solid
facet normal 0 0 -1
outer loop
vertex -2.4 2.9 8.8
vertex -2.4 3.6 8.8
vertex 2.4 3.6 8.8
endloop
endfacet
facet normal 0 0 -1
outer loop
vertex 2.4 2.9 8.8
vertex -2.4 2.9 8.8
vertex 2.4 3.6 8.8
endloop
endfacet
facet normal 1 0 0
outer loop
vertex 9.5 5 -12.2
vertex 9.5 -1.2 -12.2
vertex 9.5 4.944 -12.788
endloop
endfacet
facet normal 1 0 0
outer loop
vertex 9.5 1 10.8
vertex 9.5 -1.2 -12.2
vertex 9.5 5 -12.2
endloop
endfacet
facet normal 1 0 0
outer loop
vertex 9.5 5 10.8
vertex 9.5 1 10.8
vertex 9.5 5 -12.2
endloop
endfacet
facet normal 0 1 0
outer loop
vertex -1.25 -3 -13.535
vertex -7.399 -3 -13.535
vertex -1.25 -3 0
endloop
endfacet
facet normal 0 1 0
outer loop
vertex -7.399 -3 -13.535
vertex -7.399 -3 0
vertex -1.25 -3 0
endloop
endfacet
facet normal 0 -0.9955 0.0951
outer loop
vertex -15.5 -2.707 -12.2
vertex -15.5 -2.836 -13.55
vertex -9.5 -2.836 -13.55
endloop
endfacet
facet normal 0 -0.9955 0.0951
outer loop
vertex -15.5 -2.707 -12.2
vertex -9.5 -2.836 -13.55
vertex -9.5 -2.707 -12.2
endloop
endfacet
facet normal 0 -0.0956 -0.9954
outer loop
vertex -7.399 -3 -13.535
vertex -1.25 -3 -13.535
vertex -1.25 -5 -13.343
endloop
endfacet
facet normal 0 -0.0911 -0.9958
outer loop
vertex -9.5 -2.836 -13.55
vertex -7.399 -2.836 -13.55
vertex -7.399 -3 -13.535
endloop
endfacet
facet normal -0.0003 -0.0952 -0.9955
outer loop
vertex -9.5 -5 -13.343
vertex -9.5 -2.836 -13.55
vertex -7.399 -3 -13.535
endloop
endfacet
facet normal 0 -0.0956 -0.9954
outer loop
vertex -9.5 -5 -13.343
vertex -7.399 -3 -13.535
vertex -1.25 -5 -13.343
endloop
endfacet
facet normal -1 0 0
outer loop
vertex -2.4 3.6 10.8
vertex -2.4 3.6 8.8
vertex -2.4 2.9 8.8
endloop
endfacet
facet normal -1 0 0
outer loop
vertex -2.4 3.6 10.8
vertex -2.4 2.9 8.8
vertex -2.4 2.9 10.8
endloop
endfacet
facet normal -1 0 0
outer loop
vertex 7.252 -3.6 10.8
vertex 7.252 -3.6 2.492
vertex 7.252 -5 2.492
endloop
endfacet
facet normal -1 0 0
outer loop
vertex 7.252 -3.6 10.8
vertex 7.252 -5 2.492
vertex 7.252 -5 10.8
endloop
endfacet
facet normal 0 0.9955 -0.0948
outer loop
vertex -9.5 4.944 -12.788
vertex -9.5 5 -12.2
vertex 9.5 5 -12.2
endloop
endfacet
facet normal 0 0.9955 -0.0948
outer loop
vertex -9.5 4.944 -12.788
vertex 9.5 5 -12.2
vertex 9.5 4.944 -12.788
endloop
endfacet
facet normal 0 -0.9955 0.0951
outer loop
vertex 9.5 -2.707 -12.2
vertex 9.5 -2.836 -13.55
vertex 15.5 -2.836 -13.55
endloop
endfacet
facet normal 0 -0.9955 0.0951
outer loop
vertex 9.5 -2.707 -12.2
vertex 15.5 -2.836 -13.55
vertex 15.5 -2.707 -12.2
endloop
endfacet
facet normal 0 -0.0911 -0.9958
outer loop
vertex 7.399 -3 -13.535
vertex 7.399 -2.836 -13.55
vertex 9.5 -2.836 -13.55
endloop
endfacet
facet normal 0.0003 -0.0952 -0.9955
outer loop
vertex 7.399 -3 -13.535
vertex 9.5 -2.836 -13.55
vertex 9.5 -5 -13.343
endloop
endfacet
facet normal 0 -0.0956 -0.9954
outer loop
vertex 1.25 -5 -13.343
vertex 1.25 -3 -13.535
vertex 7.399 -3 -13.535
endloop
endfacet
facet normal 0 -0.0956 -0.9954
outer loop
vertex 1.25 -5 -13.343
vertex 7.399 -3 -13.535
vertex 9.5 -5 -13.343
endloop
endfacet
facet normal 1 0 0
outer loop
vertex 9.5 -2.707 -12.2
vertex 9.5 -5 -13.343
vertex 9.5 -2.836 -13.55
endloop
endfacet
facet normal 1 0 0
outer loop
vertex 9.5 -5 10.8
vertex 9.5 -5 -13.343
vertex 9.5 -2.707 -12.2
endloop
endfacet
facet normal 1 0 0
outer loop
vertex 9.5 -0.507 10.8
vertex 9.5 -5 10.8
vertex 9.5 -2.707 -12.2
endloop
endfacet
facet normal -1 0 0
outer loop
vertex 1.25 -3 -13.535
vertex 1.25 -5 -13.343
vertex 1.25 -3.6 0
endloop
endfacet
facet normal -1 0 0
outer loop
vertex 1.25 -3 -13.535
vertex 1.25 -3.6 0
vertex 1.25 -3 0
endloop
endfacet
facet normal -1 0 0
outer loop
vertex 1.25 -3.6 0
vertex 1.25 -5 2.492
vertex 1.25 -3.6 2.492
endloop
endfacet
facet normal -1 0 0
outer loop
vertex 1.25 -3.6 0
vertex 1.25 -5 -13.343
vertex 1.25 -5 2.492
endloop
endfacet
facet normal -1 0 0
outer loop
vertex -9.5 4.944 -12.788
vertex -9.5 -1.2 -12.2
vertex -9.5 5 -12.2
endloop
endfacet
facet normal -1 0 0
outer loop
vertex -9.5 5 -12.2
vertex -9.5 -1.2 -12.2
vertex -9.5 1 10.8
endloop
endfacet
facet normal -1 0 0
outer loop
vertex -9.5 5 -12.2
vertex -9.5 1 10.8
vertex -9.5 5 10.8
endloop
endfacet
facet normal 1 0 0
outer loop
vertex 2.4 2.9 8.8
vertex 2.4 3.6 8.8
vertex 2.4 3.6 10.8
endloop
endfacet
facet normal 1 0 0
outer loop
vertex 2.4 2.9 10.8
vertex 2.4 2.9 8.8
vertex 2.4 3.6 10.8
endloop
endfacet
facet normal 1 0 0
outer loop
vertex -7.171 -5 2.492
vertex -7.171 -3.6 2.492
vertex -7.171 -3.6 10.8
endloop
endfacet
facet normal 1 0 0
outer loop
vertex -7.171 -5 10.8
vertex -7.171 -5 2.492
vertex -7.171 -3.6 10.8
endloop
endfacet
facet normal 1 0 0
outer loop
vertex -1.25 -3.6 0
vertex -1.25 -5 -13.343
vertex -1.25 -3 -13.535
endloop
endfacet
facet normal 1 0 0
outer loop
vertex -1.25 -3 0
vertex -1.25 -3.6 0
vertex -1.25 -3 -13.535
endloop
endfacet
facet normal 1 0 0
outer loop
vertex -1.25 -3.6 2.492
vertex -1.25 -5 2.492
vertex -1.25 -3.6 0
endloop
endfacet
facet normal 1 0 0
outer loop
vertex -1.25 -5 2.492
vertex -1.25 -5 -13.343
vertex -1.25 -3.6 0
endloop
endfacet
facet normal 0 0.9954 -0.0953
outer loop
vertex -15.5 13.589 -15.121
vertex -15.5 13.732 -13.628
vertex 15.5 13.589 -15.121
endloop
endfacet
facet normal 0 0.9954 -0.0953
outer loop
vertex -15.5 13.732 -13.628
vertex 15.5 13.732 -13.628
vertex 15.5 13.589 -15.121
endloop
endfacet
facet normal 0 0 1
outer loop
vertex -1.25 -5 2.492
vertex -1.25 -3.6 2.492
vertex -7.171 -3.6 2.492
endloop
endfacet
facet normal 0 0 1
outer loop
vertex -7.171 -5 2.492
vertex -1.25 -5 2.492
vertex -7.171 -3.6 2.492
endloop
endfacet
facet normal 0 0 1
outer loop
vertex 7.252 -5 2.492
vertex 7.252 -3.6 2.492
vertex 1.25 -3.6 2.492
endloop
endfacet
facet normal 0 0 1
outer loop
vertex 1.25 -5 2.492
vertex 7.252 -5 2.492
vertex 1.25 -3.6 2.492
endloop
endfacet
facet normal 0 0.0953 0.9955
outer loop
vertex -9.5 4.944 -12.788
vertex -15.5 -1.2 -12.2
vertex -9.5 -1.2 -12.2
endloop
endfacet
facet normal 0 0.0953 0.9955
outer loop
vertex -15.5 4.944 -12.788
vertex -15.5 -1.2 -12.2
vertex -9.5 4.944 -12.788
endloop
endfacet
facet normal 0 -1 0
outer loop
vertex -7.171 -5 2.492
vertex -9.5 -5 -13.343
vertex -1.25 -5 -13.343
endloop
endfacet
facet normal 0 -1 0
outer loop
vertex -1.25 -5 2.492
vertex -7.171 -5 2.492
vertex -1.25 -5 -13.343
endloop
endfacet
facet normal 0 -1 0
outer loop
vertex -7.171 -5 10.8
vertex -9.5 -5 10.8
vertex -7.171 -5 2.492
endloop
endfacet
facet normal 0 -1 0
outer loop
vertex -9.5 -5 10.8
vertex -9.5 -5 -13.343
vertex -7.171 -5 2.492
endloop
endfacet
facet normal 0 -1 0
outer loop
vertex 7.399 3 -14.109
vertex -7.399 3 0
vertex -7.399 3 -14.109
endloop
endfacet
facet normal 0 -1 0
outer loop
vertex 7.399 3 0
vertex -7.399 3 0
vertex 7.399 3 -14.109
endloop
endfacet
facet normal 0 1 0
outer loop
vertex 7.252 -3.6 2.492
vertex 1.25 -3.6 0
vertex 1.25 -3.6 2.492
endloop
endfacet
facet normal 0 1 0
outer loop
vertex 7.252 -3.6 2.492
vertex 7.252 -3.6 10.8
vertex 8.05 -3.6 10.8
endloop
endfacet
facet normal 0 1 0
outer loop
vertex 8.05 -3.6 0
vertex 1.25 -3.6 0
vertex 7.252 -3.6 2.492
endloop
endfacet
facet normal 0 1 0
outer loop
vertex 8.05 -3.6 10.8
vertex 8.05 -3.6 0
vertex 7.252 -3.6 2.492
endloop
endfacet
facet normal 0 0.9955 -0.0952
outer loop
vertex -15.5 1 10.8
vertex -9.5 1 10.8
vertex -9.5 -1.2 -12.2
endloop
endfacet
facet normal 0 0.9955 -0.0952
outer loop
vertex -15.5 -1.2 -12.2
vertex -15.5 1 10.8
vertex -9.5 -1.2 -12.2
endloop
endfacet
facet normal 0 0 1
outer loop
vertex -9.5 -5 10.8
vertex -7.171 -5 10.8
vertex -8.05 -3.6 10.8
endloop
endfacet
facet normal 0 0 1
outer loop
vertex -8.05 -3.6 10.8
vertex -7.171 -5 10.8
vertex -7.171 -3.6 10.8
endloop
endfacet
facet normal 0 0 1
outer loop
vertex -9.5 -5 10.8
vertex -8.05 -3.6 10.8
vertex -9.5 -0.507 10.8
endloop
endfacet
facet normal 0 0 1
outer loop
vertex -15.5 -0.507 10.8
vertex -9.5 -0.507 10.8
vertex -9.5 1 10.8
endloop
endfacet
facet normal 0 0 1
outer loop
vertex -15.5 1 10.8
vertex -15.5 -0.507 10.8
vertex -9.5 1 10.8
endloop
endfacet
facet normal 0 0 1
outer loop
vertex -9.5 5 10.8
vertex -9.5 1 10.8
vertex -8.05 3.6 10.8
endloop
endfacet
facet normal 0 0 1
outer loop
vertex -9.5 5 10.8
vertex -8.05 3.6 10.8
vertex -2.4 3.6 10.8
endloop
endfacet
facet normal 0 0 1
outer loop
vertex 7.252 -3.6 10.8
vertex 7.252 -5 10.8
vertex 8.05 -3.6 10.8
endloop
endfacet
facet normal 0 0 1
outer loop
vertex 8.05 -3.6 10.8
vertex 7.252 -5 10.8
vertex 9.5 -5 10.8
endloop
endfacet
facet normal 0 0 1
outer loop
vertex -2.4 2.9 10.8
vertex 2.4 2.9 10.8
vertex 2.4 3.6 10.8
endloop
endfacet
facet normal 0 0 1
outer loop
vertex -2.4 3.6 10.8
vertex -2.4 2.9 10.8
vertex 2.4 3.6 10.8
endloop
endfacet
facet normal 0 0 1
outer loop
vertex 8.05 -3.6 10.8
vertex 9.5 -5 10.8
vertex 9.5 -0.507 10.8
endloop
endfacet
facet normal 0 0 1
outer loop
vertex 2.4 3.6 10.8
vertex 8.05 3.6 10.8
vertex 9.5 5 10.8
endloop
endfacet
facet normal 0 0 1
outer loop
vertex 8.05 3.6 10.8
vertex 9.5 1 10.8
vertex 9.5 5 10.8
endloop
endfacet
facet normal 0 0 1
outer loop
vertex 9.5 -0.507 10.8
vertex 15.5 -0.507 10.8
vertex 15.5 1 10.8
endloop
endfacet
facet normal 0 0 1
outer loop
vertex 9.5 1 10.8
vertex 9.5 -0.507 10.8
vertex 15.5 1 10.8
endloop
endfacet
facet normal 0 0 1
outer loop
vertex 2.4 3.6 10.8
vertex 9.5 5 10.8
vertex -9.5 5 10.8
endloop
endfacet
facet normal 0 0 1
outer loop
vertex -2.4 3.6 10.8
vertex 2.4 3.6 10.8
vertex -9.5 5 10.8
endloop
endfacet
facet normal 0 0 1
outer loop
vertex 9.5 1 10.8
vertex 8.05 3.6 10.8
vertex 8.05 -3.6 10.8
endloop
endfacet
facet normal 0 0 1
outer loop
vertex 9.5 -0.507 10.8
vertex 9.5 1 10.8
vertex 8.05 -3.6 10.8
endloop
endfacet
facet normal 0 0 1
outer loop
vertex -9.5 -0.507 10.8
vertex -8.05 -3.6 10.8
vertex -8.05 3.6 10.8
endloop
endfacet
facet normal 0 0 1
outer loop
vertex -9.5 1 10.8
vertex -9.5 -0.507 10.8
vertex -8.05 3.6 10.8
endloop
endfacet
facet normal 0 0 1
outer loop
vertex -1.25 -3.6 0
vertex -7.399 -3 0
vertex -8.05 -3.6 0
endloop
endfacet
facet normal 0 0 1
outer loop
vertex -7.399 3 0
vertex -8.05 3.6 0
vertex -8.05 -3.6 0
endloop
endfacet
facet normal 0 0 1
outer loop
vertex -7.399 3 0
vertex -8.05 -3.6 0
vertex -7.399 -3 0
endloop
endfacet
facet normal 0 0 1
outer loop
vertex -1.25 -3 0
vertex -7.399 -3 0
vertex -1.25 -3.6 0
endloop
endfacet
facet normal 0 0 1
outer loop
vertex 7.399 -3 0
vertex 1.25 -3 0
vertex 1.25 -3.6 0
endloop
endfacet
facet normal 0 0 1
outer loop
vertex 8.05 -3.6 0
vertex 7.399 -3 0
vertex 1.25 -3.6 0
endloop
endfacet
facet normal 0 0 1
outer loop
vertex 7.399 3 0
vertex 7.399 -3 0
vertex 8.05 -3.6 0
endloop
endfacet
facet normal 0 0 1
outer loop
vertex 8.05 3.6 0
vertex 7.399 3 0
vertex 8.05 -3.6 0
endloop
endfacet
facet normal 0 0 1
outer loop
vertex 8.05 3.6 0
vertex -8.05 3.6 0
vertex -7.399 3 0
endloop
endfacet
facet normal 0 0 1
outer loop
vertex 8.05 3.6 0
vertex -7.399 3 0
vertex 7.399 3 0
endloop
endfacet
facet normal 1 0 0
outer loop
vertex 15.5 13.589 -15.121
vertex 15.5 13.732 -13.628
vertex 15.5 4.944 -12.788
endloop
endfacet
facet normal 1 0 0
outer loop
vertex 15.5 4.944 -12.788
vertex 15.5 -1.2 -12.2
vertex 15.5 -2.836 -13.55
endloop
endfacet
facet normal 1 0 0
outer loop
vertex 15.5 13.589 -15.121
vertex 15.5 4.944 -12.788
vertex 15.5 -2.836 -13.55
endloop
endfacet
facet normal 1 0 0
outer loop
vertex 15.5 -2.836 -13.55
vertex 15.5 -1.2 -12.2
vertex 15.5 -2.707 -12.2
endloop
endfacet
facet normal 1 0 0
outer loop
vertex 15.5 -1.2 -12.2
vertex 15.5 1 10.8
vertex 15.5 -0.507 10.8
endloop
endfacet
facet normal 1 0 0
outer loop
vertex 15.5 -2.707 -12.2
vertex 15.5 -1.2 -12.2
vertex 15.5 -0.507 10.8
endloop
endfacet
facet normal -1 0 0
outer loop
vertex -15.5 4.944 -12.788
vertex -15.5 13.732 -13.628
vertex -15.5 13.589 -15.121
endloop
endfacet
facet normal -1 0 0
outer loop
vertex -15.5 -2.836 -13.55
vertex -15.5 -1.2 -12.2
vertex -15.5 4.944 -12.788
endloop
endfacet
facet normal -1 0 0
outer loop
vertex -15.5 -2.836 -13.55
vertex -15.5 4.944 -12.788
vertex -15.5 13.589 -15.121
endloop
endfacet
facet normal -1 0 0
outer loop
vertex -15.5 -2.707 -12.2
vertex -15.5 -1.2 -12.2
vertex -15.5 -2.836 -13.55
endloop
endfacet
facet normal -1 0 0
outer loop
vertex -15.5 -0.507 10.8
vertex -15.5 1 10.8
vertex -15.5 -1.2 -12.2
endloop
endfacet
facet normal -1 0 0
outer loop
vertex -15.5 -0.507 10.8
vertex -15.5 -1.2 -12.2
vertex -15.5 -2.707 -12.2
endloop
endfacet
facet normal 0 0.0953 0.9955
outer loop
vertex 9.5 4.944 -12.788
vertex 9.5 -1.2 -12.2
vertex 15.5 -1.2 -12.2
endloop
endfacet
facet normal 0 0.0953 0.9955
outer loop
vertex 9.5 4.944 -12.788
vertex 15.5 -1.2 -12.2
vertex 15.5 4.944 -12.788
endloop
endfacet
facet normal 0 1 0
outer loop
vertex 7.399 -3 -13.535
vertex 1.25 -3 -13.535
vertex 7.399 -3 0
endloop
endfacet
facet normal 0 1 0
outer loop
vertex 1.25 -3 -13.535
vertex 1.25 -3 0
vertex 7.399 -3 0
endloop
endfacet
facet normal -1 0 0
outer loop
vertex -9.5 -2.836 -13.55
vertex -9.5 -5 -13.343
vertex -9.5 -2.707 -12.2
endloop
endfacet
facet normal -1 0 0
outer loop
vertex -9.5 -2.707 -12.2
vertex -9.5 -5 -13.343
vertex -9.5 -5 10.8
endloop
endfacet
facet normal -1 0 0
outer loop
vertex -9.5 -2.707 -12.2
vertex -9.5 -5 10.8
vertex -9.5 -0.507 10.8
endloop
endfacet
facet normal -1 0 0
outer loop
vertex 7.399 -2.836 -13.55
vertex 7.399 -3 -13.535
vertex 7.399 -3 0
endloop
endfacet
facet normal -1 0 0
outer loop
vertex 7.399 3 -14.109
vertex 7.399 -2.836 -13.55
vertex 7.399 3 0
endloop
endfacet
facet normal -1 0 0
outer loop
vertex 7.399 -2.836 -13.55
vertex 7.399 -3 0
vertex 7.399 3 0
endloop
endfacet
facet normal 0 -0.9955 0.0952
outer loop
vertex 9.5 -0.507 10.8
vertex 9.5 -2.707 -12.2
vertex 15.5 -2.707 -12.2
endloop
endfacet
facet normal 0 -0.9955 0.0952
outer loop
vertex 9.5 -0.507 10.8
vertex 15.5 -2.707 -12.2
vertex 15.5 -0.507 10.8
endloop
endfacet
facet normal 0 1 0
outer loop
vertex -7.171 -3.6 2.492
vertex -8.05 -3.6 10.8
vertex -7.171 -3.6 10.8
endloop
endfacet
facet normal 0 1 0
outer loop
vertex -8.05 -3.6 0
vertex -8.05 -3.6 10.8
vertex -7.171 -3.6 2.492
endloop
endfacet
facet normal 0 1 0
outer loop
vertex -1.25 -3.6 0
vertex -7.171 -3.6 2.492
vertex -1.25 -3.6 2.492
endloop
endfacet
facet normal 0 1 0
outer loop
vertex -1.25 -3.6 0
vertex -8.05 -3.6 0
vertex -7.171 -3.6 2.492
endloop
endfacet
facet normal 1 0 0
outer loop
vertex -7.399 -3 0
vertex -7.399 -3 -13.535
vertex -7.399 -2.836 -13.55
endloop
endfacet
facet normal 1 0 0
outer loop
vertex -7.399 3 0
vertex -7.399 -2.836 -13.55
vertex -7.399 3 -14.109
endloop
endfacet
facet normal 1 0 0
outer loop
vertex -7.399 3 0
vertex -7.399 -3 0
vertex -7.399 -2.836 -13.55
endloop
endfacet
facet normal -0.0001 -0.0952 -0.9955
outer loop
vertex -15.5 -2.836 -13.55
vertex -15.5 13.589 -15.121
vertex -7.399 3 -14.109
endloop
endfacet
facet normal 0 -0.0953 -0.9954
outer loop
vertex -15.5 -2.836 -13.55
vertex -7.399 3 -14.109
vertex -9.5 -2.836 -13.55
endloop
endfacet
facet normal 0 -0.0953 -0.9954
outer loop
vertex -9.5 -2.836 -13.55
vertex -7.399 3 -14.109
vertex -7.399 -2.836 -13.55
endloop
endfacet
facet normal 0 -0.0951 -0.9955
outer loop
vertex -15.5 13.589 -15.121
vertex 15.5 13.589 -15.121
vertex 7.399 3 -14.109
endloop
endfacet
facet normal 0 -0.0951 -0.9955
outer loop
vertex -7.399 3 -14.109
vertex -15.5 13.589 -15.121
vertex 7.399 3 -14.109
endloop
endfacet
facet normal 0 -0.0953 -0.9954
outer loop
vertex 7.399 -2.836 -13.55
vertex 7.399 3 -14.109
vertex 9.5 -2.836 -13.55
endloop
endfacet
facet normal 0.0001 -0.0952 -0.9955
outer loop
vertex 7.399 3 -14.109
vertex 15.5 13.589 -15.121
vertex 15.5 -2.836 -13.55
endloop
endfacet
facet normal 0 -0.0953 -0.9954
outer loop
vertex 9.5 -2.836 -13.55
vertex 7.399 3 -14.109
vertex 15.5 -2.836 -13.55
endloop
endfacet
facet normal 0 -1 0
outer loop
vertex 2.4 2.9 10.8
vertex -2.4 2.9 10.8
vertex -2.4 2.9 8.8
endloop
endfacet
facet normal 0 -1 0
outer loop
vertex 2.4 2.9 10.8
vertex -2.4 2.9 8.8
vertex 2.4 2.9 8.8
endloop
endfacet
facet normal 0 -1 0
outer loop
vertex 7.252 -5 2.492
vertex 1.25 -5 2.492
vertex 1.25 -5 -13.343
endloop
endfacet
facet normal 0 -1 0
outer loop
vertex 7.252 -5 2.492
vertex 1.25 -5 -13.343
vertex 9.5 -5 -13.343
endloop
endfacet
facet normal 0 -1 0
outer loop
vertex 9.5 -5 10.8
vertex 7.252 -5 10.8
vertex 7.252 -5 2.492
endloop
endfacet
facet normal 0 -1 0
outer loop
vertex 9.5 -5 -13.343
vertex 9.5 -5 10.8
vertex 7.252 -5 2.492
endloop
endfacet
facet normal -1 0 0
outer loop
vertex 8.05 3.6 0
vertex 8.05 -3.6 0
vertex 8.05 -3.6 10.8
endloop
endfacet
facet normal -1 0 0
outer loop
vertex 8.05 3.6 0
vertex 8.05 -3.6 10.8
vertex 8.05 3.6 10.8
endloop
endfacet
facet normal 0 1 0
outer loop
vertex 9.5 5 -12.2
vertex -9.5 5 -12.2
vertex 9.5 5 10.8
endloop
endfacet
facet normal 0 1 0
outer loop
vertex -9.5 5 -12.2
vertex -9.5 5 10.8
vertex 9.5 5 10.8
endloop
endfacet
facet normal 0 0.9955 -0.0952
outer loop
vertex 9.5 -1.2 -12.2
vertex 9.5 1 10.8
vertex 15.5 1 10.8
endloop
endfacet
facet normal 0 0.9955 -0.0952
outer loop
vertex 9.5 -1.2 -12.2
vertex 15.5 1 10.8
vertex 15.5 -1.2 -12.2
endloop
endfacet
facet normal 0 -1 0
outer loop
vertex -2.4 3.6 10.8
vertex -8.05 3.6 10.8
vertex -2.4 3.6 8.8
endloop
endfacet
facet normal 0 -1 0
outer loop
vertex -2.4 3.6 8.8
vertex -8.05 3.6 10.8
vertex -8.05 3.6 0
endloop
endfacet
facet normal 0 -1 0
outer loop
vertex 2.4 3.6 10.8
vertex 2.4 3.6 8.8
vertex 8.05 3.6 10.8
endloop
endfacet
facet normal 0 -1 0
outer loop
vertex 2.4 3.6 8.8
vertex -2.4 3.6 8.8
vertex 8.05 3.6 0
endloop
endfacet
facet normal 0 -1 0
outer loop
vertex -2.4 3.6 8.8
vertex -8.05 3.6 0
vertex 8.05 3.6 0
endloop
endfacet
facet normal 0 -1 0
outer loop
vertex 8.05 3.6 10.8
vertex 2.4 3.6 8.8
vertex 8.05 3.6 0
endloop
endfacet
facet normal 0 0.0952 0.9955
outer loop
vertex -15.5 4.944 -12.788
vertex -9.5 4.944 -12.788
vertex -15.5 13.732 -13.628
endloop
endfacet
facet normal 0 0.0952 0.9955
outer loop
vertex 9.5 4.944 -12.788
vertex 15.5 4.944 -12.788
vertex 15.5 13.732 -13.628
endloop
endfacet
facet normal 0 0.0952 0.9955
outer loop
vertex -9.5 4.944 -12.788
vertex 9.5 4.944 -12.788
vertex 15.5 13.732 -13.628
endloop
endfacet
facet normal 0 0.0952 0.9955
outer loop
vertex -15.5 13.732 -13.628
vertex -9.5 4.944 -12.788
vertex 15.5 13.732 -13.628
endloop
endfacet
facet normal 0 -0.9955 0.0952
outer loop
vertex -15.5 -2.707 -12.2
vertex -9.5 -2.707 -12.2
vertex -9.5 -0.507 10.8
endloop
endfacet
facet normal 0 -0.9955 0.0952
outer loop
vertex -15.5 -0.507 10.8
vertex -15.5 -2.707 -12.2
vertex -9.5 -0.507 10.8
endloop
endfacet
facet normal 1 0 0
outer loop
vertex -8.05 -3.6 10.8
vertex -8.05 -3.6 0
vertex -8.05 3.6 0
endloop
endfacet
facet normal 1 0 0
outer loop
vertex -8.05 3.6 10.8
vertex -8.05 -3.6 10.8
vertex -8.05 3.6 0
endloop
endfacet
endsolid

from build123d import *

# Parameters (mm, degrees)
F0_W           = 19
F0_H           = 10
F0_W_2         = 16.1
F0_H_2         = 7.2
F1_DEPTH       = 10.8
F0_W_3         = 14.7984437644
F0_H_3         = 6.0001779348
F2_DEPTH       = 12.2
F4_DEPTH       = 6
F4_DEPTH_BACK  = 25
F5_DEPTH       = 19
F6_DEPTH       = 15.1224483792
F7_DEPTH       = 25
F8_W           = 14.4229265861
F8_H           = 8.3078492425
F9_DEPTH       = 25
F10_W          = 4.8
F10_H          = 2
F11_DEPTH      = 0.7
F12_W          = 2.5
F12_H          = 5
F13_DEPTH      = 25
F13_DEPTH_BACK = 25


with BuildPart() as f1:
    # F0 (on Top) → F1 (new body)
    with BuildSketch(Plane.XY):
        Rectangle(F0_W, F0_H)
        Rectangle(F0_W_2, F0_H_2, mode=Mode.SUBTRACT)
    extrude(amount=F1_DEPTH)

    # F0 (on Top) → F2 (join)
    with BuildSketch(Plane.XY):
        Rectangle(F0_W, F0_H)
        Rectangle(F0_W_2, F0_H_2, mode=Mode.SUBTRACT)
        Rectangle(F0_W_2, F0_H_2)
        Rectangle(F0_W_3, F0_H_3, mode=Mode.SUBTRACT)
    extrude(amount=-F2_DEPTH)

    # F3 (on face) → F4 (join, two sides)
    with BuildSketch(Plane(origin=(-9.5, 0, 0), x_dir=(0, -1, 0), z_dir=(-1, 0, 0))) as f4_sk:
        Polygon((0.4931847272, 10.8), (-1, 10.8), (1.2, -12.2), (2.7068463795, -12.2), (0.5068463795, 10.8), align=None)
        Polygon((2.7068463795, -12.2), (1.2, -12.2), (-4.943788401, -12.7876667166), (-13.7318472715, -13.6282636521), (-13.5890209063, -15.1214483792), (2.8360110924, -13.5503583619), align=None)
    extrude(amount=F4_DEPTH)
    extrude(f4_sk.sketch, amount=-F4_DEPTH_BACK)

    # F3 (on face) → F5 (join)
    with BuildSketch(Plane(origin=(-9.5, 0, 0), x_dir=(0, -1, 0), z_dir=(-1, 0, 0))):
        Polygon((-4.943788401, -12.7876667166), (1.2, -12.2), (-5, -12.2), align=None)
        Polygon((5, -12.2), (2.7068463795, -12.2), (2.8360110924, -13.5503583619), (5, -13.3433681186), align=None)
    extrude(amount=-F5_DEPTH)

    # F0 (on Top) → F6 (cut, through all)
    with BuildSketch(Plane.XY):
        Rectangle(F0_W_3, F0_H_3)
    extrude(amount=-F6_DEPTH, mode=Mode.SUBTRACT)

    # F0 (on Top) → F7 (cut)
    with BuildSketch(Plane.XY):
        Rectangle(F0_W_2, F0_H_2)
        Rectangle(F0_W_3, F0_H_3, mode=Mode.SUBTRACT)
        Rectangle(F0_W_3, F0_H_3)
    extrude(amount=F7_DEPTH, mode=Mode.SUBTRACT)

    # F8 (on face) → F9 (cut)
    with BuildSketch(Plane(origin=(0, -3.6, 0), x_dir=(-1, 0, 0), z_dir=(0, 1, 0))):
        with Locations((-0.0403469894, 6.6460753787)):
            Rectangle(F8_W, F8_H)
    extrude(amount=-F9_DEPTH, mode=Mode.SUBTRACT)

    # F10 (on face) → F11 (join)
    with BuildSketch(Plane.XZ.offset(-3.6)):
        with Locations((0, 9.8)):
            Rectangle(F10_W, F10_H)
    extrude(amount=F11_DEPTH)

    # F12 (on Top) → F13 (cut, two sides)
    with BuildSketch(Plane.XY) as f13_sk:
        with Locations((0, -4.9948594533)):
            Rectangle(F12_W, F12_H)
    extrude(amount=-F13_DEPTH, mode=Mode.SUBTRACT)
    extrude(f13_sk.sketch, amount=F13_DEPTH_BACK, mode=Mode.SUBTRACT)


solid = f1.part
